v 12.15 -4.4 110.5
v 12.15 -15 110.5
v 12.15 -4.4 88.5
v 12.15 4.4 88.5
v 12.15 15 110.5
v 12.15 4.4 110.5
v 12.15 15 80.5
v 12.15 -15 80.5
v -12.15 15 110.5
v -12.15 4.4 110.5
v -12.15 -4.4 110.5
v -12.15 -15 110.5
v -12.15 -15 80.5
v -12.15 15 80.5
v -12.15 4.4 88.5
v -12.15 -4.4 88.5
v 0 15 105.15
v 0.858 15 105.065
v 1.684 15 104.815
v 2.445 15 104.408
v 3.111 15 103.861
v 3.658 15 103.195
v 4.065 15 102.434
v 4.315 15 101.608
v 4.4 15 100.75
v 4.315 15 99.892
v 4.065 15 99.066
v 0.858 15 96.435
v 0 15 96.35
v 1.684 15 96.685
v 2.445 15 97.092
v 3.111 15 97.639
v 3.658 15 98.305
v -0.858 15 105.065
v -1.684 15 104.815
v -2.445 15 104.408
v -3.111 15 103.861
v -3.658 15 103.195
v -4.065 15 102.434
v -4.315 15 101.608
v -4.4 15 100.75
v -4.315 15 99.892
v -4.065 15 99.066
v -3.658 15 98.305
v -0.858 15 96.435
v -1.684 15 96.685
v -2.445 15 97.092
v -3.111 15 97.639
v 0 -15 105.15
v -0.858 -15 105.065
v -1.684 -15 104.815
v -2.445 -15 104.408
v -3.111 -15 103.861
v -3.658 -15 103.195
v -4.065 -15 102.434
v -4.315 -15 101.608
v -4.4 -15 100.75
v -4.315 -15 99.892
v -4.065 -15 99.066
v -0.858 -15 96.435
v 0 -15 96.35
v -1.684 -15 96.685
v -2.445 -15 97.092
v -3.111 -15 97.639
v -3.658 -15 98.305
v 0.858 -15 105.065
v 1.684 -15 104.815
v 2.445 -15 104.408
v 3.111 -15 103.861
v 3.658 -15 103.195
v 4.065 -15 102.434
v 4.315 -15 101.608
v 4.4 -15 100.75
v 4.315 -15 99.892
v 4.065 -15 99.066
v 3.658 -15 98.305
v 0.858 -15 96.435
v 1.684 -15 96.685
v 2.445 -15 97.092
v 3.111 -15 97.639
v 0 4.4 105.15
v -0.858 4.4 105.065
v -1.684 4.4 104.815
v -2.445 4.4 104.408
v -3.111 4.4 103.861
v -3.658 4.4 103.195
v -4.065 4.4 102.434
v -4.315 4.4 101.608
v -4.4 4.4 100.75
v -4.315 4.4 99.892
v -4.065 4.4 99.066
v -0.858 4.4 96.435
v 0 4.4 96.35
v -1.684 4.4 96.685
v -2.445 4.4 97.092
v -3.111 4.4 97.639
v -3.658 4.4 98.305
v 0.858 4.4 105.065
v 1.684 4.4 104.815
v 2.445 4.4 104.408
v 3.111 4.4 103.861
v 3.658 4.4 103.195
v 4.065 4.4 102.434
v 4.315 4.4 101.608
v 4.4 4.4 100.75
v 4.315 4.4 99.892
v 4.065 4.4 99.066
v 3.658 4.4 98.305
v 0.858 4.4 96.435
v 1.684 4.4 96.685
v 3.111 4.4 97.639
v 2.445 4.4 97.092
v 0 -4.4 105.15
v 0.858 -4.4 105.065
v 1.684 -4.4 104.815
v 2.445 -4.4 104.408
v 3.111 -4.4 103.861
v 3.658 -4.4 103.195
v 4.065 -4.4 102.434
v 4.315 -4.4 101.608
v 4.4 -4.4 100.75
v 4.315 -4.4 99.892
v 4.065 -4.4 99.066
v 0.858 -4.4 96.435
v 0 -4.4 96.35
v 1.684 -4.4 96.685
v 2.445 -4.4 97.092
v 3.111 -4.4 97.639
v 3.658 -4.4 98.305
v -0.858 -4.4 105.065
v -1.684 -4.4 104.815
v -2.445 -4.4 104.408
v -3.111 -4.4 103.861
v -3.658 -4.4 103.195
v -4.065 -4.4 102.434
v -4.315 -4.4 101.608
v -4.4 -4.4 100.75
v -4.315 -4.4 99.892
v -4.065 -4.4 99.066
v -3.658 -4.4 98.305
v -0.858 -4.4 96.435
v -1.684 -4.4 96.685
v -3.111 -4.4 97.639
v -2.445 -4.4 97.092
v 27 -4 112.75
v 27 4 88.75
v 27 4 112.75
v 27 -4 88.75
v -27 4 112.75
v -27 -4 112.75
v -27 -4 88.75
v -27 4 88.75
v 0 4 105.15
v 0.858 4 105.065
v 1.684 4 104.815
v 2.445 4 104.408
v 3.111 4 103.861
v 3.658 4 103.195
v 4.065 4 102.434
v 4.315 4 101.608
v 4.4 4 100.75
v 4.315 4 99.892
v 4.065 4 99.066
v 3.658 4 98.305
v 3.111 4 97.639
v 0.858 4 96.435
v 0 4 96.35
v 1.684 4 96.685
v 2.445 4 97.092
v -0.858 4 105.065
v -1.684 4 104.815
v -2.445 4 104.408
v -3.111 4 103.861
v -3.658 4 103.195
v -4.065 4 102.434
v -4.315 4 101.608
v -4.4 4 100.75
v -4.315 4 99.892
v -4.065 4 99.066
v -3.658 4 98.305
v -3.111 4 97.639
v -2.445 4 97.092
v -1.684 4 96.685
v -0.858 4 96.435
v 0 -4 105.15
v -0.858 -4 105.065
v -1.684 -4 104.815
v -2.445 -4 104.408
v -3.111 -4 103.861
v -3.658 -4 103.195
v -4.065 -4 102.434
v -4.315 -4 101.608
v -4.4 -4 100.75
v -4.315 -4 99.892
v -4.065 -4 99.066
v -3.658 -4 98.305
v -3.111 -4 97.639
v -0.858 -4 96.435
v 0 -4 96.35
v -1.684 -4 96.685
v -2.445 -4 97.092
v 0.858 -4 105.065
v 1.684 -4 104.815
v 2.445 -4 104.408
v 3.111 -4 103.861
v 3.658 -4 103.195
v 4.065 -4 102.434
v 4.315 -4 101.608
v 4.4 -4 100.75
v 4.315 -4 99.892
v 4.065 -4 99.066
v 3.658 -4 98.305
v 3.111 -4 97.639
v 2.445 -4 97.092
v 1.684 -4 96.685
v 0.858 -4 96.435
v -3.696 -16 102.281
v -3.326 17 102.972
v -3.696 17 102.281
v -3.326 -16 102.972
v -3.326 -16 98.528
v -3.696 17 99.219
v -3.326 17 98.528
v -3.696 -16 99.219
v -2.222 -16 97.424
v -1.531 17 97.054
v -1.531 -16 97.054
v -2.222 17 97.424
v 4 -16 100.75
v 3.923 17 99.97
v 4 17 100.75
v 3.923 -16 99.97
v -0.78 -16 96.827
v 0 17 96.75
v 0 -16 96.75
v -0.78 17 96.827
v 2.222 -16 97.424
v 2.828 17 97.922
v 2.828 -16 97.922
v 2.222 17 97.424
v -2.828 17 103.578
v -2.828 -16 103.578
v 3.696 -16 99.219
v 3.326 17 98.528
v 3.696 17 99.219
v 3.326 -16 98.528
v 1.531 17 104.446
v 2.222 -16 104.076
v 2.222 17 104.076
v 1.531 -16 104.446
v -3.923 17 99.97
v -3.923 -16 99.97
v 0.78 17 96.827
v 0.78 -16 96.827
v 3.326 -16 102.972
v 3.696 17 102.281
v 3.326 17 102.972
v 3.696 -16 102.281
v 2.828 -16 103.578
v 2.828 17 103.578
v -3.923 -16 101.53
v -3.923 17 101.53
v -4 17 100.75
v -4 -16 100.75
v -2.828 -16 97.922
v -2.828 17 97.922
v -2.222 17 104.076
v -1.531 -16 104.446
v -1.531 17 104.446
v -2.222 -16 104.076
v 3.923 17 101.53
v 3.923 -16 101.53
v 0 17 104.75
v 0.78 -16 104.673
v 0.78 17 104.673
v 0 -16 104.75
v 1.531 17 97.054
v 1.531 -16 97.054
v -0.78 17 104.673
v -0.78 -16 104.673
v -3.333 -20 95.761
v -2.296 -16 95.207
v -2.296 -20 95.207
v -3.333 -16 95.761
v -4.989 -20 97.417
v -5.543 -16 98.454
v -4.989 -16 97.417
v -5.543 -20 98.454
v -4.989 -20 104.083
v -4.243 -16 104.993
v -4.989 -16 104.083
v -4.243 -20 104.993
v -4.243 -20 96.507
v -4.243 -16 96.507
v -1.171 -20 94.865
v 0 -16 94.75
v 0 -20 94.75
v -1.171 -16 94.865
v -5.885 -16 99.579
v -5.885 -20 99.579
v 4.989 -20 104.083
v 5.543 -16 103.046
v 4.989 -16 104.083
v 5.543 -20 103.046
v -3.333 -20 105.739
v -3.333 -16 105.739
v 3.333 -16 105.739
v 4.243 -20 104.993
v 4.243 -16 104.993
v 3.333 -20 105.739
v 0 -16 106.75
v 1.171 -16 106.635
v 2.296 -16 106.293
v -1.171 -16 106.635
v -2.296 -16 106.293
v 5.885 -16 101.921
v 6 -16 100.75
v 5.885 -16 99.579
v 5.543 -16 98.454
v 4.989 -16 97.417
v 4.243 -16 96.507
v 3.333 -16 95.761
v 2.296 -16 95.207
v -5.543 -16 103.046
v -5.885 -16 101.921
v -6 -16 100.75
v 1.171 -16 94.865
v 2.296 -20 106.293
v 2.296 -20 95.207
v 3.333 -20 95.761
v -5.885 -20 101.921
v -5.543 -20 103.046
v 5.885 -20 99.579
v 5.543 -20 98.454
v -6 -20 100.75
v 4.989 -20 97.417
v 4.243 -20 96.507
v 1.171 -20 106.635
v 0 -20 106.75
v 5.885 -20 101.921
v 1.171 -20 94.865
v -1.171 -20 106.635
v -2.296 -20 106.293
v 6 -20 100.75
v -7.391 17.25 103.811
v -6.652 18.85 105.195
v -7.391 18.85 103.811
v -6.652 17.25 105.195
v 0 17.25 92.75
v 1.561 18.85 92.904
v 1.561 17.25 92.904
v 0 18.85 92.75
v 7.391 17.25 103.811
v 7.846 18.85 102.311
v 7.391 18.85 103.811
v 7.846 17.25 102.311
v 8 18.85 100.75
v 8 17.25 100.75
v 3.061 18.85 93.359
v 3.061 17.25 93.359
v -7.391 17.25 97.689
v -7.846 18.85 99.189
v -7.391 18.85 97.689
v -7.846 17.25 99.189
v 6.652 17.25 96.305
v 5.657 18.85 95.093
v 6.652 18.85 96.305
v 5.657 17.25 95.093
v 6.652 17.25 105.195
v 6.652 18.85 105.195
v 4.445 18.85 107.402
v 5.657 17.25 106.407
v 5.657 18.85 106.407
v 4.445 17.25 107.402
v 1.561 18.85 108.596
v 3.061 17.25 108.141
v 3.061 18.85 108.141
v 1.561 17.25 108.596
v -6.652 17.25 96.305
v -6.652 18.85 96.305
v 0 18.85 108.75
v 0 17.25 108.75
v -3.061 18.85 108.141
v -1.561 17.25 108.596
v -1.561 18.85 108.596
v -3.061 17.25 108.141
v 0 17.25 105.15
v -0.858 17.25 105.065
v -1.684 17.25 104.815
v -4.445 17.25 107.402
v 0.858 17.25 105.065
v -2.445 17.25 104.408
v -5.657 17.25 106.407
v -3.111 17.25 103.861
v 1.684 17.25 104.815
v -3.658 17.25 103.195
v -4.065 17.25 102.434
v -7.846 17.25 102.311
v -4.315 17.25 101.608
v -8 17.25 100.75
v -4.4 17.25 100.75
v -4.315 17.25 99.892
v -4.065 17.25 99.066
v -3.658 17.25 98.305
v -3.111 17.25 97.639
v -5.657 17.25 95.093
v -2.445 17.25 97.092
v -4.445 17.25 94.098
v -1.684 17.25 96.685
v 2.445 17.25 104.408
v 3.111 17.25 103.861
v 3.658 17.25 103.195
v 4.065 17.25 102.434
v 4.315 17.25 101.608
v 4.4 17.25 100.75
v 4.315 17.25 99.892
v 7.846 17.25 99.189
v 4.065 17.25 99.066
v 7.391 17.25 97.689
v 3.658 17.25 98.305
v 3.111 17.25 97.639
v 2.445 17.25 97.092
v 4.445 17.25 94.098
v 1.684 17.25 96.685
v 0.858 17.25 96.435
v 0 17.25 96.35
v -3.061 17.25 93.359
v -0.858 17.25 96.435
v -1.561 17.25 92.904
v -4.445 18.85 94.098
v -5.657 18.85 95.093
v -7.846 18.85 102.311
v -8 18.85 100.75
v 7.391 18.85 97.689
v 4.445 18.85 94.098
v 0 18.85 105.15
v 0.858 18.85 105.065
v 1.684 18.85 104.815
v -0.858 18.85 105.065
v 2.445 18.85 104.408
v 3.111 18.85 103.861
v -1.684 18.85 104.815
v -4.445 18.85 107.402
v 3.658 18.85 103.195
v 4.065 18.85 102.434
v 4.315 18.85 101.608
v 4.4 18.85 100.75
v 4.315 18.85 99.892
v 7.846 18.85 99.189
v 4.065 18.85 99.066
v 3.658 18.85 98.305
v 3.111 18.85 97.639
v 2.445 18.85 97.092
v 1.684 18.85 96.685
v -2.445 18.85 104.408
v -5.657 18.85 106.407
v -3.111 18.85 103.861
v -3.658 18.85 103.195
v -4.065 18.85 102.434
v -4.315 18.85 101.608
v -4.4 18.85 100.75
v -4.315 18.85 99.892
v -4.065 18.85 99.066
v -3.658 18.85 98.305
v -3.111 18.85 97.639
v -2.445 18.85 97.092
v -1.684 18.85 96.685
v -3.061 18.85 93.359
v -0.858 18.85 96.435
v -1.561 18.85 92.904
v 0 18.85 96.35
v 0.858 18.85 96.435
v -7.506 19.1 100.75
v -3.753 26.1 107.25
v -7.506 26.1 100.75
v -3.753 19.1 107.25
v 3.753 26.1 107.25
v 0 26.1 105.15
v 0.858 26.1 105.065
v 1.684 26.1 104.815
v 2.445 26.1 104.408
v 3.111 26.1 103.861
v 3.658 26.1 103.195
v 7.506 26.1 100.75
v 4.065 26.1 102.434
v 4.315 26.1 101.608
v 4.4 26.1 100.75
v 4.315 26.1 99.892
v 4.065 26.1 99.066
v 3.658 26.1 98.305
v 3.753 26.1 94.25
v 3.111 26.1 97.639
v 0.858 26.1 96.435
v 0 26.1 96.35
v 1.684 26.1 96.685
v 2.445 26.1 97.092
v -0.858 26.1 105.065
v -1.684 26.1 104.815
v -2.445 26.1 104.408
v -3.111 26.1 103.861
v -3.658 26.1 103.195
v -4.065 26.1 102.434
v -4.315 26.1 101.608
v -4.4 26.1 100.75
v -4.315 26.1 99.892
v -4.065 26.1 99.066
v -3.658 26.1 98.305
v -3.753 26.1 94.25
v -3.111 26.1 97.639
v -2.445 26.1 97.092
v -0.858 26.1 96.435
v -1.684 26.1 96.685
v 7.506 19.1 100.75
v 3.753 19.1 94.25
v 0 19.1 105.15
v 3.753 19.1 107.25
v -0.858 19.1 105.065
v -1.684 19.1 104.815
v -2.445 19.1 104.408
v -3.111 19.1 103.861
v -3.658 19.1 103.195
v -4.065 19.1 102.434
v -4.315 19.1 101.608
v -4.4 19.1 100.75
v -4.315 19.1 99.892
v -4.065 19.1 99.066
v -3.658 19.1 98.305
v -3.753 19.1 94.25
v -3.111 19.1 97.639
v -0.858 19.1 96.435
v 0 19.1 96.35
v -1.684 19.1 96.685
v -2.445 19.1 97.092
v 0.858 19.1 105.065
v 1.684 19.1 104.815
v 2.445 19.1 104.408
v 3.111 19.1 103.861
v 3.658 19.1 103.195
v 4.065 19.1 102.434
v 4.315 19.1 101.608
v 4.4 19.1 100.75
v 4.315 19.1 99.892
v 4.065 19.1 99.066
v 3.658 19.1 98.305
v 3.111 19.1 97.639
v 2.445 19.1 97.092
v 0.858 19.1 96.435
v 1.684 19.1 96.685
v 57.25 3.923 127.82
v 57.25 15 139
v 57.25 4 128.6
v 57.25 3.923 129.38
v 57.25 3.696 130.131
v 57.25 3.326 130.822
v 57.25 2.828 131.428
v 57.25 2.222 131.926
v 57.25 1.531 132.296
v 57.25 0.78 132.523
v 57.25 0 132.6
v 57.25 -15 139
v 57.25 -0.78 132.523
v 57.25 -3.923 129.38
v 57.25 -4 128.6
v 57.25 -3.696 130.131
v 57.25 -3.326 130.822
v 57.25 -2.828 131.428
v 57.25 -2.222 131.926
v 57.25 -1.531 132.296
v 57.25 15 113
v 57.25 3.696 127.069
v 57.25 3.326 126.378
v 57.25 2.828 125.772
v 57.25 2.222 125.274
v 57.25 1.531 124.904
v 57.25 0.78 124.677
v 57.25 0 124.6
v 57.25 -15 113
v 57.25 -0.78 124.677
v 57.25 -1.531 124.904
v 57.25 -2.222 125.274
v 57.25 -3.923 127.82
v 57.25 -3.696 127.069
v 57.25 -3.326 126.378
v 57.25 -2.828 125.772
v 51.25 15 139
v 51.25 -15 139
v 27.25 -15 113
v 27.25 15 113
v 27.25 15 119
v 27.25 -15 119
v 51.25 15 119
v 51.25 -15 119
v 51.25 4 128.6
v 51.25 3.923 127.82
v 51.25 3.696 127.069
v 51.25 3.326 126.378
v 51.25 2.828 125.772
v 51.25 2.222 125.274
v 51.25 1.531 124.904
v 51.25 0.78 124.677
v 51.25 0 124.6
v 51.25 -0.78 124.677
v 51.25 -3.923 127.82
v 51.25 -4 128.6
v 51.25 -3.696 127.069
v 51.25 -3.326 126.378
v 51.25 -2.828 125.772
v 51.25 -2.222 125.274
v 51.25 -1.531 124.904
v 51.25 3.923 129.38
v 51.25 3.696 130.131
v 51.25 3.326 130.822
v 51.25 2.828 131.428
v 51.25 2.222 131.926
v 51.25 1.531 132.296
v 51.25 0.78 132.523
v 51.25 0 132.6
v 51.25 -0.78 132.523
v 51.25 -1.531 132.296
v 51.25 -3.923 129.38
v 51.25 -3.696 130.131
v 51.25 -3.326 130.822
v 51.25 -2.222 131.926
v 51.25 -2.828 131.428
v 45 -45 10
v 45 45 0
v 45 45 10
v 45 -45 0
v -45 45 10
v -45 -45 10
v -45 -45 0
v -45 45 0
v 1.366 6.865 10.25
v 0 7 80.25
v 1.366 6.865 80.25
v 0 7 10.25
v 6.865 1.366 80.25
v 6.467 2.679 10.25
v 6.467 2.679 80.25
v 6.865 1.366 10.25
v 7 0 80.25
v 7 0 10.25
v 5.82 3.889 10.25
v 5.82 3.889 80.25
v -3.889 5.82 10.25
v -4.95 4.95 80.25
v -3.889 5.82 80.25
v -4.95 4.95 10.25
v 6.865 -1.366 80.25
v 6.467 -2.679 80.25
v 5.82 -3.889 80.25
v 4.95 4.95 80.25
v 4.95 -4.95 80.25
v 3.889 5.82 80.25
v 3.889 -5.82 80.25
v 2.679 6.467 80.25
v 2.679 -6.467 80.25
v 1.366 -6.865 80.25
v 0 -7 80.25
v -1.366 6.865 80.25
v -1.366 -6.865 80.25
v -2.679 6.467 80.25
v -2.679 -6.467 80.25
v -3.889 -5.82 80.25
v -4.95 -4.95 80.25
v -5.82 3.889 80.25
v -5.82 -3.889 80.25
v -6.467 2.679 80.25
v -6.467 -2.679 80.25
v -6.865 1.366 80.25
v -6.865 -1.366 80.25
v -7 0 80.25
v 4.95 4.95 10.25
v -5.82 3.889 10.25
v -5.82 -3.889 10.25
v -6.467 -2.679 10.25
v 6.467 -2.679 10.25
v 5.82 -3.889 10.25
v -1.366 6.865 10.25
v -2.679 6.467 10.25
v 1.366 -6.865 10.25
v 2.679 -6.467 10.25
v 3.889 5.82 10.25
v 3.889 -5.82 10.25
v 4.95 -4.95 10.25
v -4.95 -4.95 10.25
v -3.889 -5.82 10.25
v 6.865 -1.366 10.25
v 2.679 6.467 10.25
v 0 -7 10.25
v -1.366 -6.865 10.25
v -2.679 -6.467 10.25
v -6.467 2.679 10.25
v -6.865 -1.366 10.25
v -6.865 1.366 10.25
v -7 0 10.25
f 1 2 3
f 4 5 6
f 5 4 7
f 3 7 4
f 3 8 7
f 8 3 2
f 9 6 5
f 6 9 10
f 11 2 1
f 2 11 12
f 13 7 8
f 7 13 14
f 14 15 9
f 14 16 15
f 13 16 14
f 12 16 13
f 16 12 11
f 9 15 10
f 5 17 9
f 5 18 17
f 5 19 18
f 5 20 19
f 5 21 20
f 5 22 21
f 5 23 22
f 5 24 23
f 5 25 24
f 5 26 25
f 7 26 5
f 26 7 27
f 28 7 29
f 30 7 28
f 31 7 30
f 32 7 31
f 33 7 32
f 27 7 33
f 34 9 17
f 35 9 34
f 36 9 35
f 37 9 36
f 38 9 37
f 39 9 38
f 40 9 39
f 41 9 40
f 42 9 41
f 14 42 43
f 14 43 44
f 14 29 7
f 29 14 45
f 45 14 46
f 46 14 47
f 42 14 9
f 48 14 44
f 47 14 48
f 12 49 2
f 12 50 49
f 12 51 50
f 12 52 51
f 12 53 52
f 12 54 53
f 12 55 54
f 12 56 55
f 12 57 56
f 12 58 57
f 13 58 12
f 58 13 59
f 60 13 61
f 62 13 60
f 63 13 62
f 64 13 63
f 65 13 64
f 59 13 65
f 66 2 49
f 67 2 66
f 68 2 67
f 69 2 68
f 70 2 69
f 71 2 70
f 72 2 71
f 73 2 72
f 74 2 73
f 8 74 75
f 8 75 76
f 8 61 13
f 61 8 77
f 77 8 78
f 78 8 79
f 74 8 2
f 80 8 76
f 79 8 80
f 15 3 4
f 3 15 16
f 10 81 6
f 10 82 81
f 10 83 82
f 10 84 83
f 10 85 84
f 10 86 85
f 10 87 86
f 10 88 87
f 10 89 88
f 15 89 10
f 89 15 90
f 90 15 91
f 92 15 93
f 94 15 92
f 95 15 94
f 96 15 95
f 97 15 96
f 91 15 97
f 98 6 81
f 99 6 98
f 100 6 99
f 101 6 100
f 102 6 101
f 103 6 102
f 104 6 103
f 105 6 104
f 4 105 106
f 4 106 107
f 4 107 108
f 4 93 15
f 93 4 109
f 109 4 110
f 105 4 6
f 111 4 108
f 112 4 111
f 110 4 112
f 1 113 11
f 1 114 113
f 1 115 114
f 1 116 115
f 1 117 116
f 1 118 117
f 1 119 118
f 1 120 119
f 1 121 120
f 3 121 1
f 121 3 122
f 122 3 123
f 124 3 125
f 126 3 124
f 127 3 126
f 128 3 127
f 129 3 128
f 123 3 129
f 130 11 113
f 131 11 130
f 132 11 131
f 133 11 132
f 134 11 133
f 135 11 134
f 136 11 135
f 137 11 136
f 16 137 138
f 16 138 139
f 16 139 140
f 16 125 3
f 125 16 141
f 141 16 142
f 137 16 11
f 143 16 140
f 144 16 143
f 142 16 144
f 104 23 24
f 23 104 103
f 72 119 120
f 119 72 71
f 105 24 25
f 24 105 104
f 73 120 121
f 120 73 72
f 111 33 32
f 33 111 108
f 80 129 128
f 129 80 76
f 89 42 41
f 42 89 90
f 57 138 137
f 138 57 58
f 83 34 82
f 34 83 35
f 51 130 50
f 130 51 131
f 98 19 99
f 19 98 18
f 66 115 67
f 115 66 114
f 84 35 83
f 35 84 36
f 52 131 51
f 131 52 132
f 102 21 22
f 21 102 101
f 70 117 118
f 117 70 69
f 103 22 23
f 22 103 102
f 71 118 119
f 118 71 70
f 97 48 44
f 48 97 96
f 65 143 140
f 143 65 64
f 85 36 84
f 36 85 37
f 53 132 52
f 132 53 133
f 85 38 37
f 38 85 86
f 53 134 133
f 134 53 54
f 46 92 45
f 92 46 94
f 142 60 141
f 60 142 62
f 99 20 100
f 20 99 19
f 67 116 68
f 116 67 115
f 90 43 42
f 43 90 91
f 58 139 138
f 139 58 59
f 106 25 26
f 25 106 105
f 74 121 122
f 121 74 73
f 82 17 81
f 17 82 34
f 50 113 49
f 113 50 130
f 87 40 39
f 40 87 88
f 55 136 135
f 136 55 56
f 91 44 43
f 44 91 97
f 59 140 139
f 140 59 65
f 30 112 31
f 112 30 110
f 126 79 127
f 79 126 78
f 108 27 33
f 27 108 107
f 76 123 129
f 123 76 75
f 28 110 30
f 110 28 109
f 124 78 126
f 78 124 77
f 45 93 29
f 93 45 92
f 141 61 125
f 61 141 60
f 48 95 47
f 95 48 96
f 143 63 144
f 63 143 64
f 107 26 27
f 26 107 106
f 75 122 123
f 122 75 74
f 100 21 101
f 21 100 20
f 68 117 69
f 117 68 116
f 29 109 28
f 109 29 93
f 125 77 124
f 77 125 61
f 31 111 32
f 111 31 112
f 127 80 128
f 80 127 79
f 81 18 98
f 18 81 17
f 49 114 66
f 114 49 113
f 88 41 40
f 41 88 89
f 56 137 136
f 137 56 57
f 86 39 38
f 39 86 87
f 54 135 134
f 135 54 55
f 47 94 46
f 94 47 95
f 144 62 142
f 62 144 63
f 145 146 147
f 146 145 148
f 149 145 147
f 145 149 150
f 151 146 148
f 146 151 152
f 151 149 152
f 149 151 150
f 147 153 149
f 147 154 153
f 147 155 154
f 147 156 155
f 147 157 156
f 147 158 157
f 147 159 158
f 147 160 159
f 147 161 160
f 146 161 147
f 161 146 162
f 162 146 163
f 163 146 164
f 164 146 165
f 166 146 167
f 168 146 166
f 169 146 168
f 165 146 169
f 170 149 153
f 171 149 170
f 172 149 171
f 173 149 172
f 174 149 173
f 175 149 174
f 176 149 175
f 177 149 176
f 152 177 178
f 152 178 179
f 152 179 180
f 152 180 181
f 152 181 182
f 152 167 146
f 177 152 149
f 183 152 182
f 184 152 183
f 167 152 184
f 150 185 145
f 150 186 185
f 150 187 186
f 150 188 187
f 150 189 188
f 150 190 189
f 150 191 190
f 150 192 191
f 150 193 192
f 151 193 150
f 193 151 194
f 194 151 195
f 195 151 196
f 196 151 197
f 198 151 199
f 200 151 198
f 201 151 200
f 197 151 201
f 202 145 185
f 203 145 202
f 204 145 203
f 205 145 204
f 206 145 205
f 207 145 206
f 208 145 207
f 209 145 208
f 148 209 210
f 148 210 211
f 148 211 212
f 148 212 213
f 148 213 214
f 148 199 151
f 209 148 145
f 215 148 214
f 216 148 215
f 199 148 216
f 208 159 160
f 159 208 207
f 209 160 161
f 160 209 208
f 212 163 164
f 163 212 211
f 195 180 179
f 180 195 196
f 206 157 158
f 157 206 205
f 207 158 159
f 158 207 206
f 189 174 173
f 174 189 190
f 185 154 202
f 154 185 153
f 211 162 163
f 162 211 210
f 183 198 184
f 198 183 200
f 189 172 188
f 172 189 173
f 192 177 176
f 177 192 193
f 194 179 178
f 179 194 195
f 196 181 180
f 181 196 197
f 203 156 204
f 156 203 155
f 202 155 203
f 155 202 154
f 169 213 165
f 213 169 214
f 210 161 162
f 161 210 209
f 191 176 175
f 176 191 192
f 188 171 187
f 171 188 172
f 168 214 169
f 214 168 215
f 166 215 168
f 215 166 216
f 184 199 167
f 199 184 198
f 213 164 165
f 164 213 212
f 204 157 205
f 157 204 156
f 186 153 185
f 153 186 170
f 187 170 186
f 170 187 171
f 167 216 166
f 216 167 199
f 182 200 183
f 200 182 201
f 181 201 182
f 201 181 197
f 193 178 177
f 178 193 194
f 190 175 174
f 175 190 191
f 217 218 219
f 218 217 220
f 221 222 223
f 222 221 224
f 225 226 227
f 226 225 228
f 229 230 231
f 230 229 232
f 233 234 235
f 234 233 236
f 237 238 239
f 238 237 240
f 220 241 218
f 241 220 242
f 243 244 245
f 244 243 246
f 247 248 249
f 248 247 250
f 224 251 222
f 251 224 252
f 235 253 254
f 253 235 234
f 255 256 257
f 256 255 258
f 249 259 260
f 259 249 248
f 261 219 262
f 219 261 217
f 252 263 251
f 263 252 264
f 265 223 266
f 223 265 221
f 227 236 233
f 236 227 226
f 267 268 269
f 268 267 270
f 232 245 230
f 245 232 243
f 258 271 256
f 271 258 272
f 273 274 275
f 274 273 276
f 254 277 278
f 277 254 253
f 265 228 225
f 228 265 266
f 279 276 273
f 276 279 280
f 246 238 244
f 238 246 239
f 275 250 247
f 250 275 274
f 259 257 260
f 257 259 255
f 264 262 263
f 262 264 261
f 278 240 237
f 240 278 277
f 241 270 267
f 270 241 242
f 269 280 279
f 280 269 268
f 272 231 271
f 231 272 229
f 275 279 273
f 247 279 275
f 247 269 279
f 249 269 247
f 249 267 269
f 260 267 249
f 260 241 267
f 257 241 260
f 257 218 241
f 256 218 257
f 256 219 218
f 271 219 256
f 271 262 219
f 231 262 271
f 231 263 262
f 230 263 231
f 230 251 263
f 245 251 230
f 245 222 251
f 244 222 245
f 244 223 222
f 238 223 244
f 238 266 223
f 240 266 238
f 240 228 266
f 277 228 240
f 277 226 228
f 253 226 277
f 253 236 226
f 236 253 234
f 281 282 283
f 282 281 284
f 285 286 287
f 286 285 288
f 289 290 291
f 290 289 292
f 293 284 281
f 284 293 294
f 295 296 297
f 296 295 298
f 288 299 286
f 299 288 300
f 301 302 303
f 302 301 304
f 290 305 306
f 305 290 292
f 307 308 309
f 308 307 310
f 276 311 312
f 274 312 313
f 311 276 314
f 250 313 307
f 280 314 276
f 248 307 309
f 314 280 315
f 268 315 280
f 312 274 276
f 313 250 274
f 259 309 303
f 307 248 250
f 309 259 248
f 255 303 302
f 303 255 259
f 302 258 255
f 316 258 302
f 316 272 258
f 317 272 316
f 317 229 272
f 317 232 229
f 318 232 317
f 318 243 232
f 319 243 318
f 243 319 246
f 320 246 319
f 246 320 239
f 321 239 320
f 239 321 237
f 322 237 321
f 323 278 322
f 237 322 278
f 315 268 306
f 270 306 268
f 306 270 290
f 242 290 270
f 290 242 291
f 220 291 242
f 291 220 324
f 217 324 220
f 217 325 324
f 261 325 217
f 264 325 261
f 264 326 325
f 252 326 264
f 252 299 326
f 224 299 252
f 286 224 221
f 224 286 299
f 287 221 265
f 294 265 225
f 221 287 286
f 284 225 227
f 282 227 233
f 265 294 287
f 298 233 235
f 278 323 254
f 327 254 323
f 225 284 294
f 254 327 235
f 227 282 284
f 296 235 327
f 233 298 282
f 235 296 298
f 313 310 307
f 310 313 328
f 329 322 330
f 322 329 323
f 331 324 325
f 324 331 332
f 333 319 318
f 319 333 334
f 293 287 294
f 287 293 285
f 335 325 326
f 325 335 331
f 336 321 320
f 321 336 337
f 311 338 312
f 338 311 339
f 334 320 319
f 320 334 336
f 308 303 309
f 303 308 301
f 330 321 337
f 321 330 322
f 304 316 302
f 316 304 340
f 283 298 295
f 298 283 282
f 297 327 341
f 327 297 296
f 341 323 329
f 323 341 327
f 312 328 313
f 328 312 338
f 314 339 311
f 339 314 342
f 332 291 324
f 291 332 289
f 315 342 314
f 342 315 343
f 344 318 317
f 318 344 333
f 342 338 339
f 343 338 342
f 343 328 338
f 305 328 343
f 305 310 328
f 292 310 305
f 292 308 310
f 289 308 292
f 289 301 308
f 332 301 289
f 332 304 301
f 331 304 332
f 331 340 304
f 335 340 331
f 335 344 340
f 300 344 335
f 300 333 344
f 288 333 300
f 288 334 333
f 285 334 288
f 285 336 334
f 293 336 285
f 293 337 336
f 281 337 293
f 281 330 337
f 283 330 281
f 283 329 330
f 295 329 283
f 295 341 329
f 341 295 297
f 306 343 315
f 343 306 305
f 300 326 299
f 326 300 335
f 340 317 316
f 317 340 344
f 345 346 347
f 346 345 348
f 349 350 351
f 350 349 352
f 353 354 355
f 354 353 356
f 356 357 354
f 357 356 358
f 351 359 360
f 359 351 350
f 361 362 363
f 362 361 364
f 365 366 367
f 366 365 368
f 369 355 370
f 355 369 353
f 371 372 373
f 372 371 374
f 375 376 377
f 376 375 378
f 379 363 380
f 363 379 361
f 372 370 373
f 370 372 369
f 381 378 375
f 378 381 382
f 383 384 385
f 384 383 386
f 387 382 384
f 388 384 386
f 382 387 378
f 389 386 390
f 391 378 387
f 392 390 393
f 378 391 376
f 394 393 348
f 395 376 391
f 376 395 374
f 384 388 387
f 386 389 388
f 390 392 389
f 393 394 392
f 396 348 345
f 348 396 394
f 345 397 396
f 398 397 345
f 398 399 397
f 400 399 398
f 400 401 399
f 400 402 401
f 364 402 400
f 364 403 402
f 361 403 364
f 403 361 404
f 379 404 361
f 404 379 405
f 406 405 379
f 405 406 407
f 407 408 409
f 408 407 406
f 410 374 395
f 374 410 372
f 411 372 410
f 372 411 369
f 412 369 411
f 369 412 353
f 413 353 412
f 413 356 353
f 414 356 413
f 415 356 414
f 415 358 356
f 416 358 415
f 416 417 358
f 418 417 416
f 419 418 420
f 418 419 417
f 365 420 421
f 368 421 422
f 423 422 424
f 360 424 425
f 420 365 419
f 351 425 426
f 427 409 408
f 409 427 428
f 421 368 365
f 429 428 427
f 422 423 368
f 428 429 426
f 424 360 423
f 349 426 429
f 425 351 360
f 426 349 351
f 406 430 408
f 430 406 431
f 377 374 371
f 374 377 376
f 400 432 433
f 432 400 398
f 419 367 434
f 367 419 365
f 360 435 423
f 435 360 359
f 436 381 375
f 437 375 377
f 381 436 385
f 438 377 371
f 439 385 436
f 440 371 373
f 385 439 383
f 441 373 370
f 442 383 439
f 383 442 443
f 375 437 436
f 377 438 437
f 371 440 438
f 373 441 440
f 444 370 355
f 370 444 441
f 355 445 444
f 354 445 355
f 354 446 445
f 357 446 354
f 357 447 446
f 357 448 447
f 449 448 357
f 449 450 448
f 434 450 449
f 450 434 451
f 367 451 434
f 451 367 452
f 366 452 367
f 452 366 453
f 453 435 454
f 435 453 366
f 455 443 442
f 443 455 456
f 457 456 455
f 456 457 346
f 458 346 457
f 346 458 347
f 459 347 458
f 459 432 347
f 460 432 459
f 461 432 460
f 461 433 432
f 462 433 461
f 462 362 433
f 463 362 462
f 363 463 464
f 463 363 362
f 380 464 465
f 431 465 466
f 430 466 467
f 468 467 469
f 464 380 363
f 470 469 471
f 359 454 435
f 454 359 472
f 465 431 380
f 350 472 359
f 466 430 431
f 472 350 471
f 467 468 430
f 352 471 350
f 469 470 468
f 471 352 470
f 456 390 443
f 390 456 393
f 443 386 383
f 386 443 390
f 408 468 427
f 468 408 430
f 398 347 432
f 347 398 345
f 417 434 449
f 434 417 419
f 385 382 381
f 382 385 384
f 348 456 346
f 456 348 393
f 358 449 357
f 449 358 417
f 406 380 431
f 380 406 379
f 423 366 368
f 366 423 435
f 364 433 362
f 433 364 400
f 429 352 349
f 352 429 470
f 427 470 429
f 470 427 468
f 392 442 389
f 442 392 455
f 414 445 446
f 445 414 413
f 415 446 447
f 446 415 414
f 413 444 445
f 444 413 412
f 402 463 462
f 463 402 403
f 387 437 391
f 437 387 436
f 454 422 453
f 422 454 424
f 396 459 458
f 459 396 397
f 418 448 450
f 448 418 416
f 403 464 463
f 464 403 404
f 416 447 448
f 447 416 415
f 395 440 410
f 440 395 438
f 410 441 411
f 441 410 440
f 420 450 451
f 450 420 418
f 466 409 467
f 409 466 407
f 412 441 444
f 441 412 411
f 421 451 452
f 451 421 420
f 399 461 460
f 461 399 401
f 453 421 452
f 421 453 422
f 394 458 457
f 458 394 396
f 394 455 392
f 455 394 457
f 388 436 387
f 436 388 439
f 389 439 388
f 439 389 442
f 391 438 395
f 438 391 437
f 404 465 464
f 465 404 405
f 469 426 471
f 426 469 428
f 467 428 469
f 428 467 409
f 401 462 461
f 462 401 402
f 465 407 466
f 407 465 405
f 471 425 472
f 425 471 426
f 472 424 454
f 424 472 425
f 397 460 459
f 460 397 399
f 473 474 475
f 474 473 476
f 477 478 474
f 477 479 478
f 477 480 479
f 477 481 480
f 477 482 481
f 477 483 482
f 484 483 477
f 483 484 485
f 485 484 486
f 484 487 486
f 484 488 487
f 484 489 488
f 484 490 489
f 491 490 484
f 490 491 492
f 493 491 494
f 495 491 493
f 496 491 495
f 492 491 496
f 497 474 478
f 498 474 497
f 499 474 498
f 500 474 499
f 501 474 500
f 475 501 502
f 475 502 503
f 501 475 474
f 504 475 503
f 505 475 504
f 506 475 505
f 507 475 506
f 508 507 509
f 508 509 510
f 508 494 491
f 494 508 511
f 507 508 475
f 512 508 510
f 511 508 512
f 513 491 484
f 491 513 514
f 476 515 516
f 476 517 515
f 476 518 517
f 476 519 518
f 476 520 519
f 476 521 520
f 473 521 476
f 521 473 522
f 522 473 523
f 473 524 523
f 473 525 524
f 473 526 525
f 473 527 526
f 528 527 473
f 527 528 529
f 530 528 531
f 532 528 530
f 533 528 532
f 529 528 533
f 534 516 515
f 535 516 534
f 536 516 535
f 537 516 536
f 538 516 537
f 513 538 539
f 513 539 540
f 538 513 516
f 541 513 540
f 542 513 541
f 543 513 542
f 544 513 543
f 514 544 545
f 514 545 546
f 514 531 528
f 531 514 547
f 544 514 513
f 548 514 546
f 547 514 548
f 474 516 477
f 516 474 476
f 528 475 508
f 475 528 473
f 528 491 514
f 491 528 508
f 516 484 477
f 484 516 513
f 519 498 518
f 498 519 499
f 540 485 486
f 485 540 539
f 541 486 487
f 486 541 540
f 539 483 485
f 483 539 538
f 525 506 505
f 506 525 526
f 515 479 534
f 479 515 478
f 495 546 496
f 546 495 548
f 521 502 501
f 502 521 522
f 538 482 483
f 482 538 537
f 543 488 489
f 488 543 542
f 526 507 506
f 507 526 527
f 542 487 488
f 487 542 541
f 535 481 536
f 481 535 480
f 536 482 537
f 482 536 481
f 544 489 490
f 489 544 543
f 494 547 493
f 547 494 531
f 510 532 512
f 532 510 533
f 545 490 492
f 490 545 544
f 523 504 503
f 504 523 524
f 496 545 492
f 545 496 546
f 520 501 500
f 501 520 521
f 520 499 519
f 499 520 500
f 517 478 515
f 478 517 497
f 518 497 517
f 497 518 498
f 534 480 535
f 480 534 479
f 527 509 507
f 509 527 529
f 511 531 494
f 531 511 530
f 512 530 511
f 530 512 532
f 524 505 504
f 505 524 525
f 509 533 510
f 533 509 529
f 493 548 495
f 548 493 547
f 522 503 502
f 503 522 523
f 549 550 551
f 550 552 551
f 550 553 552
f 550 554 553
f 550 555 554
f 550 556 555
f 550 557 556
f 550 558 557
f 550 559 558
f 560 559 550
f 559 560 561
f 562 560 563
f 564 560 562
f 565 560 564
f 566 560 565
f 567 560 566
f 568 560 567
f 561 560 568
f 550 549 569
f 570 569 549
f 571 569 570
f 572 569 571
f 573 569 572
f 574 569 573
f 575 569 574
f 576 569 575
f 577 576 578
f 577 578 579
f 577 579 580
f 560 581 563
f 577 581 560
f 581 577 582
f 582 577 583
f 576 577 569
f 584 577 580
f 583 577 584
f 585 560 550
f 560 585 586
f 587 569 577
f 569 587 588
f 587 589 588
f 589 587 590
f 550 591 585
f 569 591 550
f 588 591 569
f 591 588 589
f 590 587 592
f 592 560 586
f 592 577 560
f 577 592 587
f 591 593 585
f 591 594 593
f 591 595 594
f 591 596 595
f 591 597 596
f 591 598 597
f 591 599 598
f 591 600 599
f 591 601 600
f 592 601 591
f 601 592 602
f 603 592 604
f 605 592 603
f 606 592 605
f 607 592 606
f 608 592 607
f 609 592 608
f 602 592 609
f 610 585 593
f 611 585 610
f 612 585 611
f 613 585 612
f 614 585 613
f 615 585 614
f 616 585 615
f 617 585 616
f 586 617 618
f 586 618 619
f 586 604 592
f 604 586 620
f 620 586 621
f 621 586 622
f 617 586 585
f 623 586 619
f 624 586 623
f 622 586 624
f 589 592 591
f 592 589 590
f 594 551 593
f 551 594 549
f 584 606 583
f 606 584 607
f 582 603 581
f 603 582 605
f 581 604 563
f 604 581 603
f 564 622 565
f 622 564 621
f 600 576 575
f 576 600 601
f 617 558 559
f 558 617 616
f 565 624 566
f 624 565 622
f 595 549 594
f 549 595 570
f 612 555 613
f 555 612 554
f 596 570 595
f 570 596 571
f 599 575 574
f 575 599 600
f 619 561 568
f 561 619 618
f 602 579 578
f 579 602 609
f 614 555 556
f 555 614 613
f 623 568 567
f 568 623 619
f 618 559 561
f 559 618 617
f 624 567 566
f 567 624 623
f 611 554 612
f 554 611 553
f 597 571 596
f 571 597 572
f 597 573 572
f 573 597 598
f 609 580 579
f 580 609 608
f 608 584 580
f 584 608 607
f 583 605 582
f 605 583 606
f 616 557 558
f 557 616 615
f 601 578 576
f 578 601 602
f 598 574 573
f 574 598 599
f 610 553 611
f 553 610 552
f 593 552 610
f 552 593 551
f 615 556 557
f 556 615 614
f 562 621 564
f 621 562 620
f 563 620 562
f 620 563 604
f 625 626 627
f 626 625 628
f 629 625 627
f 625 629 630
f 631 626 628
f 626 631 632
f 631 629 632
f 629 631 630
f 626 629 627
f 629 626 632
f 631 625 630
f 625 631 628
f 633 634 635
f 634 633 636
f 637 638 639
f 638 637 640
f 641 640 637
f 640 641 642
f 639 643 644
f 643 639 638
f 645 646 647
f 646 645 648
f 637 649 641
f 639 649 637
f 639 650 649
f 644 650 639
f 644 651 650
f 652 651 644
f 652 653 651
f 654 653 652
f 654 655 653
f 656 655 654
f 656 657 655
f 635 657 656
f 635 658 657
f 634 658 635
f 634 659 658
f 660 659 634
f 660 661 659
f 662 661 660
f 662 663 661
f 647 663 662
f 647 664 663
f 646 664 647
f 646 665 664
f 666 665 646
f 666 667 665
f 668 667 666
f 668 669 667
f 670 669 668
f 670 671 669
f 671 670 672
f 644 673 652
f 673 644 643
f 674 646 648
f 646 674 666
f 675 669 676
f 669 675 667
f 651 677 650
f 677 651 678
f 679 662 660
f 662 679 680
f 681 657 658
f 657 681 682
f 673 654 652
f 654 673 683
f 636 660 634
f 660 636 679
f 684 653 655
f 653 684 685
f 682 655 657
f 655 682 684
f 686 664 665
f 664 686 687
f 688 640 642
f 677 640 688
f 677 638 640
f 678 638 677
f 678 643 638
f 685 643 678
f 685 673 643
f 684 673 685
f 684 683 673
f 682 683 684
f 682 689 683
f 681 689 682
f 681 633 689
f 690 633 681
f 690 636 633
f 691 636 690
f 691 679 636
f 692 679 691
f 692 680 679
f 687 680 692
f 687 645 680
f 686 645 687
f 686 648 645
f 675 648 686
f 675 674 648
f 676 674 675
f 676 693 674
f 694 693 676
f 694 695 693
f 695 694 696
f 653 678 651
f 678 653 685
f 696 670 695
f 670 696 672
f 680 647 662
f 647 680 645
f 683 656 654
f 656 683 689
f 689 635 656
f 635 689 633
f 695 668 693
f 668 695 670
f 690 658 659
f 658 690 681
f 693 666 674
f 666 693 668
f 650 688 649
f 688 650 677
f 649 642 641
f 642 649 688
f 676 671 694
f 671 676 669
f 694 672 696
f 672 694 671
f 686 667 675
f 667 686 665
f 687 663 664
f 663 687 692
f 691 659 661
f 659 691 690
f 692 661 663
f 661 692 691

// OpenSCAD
$fn = 32;

// ------------------------------------------------------------------------
// Lamp arm: column d14 x 70 mm, arm 54 mm
// Every part is its own module, assembly() places every instance.
// ------------------------------------------------------------------------

// --- part 1 ---
module lamp_base() {
  difference() {
    translate([-45, -45, 0]) cube([90, 90, 10]);
  }
}

// --- part 2 ---
module lamp_column() {
  cylinder(h = 70, d = 14);
}

// --- part 3 ---
module head_fork() {
  difference() {
    translate([-12.15, -15, 0]) cube([24.3, 30, 30]);
    translate([-13.15, -4.4, 8]) cube([26.3, 8.8, 23]);
    translate([0, 0, 20.25]) rotate([90, 0, 0]) cylinder(h = 32, d = 8.8, center = true);
  }
}

// --- part 4 ---
module lamp_arm() {
  difference() {
    translate([-27, -4, 0]) cube([54, 8, 24]);
    translate([0, 0, 12]) rotate([90, 0, 0]) cylinder(h = 10, d = 8.8, center = true);
  }
}

// --- part 5 ---
module arm_pin() {
  rotate([0, 90, 0]) cylinder(h = 34, d = 8, center = true);
  translate([-20, 0, 0]) rotate([0, 90, 0]) cylinder(h = 4, d = 12);
}

// --- part 6 ---
module arm_washer() {
  difference() {
      translate([0, 0, 0]) cylinder(h = 1.6, d = 16);
      translate([0, 0, -1]) cylinder(h = 3.6, d = 8.8);
    }
}

// --- part 7 ---
module arm_nut() {
  difference() {
    linear_extrude(height = 7) polygon(points = [[7.506, 0], [3.753, 6.5], [-3.753, 6.5], [-7.506, 0], [-3.753, -6.5], [3.753, -6.5]]);
    translate([0, 0, -1]) cylinder(h = 9, d = 8.8);
  }
}

// --- part 8 ---
module shade_bracket() {
  difference() {
    translate([-15, -15, 0]) cube([30, 30, 26]);
    translate([-16, -16, 6]) cube([25, 32, 21]);
    translate([12, 0, 15.6]) rotate([0, 90, 0]) cylinder(h = 8, d = 8, center = true);
  }
}

// --- assembly ---
module assembly() {
  color([0.80, 0.24, 0.20]) translate([0, 0, 0]) rotate([0, 0, 0]) lamp_base();
  color([0.20, 0.45, 0.75]) translate([0, 0, 10.25]) rotate([0, 0, 0]) lamp_column();
  color([0.25, 0.62, 0.32]) translate([0, 0, 80.5]) rotate([0, 0, 0]) head_fork();
  color([0.92, 0.70, 0.18]) translate([0, 0, 88.75]) rotate([0, 0, 0]) lamp_arm();
  color([0.58, 0.35, 0.70]) translate([0, 0, 100.75]) rotate([0, 0, 90]) arm_pin();
  color([0.16, 0.66, 0.66]) translate([0, 18.85, 100.75]) rotate([90, 0, 0]) arm_washer();
  color([0.85, 0.48, 0.18]) translate([0, 26.1, 100.75]) rotate([90, 0, 0]) arm_nut();
  color([0.55, 0.60, 0.65]) translate([42.25, 0, 113]) rotate([0, 0, 0]) shade_bracket();
}

assembly();
